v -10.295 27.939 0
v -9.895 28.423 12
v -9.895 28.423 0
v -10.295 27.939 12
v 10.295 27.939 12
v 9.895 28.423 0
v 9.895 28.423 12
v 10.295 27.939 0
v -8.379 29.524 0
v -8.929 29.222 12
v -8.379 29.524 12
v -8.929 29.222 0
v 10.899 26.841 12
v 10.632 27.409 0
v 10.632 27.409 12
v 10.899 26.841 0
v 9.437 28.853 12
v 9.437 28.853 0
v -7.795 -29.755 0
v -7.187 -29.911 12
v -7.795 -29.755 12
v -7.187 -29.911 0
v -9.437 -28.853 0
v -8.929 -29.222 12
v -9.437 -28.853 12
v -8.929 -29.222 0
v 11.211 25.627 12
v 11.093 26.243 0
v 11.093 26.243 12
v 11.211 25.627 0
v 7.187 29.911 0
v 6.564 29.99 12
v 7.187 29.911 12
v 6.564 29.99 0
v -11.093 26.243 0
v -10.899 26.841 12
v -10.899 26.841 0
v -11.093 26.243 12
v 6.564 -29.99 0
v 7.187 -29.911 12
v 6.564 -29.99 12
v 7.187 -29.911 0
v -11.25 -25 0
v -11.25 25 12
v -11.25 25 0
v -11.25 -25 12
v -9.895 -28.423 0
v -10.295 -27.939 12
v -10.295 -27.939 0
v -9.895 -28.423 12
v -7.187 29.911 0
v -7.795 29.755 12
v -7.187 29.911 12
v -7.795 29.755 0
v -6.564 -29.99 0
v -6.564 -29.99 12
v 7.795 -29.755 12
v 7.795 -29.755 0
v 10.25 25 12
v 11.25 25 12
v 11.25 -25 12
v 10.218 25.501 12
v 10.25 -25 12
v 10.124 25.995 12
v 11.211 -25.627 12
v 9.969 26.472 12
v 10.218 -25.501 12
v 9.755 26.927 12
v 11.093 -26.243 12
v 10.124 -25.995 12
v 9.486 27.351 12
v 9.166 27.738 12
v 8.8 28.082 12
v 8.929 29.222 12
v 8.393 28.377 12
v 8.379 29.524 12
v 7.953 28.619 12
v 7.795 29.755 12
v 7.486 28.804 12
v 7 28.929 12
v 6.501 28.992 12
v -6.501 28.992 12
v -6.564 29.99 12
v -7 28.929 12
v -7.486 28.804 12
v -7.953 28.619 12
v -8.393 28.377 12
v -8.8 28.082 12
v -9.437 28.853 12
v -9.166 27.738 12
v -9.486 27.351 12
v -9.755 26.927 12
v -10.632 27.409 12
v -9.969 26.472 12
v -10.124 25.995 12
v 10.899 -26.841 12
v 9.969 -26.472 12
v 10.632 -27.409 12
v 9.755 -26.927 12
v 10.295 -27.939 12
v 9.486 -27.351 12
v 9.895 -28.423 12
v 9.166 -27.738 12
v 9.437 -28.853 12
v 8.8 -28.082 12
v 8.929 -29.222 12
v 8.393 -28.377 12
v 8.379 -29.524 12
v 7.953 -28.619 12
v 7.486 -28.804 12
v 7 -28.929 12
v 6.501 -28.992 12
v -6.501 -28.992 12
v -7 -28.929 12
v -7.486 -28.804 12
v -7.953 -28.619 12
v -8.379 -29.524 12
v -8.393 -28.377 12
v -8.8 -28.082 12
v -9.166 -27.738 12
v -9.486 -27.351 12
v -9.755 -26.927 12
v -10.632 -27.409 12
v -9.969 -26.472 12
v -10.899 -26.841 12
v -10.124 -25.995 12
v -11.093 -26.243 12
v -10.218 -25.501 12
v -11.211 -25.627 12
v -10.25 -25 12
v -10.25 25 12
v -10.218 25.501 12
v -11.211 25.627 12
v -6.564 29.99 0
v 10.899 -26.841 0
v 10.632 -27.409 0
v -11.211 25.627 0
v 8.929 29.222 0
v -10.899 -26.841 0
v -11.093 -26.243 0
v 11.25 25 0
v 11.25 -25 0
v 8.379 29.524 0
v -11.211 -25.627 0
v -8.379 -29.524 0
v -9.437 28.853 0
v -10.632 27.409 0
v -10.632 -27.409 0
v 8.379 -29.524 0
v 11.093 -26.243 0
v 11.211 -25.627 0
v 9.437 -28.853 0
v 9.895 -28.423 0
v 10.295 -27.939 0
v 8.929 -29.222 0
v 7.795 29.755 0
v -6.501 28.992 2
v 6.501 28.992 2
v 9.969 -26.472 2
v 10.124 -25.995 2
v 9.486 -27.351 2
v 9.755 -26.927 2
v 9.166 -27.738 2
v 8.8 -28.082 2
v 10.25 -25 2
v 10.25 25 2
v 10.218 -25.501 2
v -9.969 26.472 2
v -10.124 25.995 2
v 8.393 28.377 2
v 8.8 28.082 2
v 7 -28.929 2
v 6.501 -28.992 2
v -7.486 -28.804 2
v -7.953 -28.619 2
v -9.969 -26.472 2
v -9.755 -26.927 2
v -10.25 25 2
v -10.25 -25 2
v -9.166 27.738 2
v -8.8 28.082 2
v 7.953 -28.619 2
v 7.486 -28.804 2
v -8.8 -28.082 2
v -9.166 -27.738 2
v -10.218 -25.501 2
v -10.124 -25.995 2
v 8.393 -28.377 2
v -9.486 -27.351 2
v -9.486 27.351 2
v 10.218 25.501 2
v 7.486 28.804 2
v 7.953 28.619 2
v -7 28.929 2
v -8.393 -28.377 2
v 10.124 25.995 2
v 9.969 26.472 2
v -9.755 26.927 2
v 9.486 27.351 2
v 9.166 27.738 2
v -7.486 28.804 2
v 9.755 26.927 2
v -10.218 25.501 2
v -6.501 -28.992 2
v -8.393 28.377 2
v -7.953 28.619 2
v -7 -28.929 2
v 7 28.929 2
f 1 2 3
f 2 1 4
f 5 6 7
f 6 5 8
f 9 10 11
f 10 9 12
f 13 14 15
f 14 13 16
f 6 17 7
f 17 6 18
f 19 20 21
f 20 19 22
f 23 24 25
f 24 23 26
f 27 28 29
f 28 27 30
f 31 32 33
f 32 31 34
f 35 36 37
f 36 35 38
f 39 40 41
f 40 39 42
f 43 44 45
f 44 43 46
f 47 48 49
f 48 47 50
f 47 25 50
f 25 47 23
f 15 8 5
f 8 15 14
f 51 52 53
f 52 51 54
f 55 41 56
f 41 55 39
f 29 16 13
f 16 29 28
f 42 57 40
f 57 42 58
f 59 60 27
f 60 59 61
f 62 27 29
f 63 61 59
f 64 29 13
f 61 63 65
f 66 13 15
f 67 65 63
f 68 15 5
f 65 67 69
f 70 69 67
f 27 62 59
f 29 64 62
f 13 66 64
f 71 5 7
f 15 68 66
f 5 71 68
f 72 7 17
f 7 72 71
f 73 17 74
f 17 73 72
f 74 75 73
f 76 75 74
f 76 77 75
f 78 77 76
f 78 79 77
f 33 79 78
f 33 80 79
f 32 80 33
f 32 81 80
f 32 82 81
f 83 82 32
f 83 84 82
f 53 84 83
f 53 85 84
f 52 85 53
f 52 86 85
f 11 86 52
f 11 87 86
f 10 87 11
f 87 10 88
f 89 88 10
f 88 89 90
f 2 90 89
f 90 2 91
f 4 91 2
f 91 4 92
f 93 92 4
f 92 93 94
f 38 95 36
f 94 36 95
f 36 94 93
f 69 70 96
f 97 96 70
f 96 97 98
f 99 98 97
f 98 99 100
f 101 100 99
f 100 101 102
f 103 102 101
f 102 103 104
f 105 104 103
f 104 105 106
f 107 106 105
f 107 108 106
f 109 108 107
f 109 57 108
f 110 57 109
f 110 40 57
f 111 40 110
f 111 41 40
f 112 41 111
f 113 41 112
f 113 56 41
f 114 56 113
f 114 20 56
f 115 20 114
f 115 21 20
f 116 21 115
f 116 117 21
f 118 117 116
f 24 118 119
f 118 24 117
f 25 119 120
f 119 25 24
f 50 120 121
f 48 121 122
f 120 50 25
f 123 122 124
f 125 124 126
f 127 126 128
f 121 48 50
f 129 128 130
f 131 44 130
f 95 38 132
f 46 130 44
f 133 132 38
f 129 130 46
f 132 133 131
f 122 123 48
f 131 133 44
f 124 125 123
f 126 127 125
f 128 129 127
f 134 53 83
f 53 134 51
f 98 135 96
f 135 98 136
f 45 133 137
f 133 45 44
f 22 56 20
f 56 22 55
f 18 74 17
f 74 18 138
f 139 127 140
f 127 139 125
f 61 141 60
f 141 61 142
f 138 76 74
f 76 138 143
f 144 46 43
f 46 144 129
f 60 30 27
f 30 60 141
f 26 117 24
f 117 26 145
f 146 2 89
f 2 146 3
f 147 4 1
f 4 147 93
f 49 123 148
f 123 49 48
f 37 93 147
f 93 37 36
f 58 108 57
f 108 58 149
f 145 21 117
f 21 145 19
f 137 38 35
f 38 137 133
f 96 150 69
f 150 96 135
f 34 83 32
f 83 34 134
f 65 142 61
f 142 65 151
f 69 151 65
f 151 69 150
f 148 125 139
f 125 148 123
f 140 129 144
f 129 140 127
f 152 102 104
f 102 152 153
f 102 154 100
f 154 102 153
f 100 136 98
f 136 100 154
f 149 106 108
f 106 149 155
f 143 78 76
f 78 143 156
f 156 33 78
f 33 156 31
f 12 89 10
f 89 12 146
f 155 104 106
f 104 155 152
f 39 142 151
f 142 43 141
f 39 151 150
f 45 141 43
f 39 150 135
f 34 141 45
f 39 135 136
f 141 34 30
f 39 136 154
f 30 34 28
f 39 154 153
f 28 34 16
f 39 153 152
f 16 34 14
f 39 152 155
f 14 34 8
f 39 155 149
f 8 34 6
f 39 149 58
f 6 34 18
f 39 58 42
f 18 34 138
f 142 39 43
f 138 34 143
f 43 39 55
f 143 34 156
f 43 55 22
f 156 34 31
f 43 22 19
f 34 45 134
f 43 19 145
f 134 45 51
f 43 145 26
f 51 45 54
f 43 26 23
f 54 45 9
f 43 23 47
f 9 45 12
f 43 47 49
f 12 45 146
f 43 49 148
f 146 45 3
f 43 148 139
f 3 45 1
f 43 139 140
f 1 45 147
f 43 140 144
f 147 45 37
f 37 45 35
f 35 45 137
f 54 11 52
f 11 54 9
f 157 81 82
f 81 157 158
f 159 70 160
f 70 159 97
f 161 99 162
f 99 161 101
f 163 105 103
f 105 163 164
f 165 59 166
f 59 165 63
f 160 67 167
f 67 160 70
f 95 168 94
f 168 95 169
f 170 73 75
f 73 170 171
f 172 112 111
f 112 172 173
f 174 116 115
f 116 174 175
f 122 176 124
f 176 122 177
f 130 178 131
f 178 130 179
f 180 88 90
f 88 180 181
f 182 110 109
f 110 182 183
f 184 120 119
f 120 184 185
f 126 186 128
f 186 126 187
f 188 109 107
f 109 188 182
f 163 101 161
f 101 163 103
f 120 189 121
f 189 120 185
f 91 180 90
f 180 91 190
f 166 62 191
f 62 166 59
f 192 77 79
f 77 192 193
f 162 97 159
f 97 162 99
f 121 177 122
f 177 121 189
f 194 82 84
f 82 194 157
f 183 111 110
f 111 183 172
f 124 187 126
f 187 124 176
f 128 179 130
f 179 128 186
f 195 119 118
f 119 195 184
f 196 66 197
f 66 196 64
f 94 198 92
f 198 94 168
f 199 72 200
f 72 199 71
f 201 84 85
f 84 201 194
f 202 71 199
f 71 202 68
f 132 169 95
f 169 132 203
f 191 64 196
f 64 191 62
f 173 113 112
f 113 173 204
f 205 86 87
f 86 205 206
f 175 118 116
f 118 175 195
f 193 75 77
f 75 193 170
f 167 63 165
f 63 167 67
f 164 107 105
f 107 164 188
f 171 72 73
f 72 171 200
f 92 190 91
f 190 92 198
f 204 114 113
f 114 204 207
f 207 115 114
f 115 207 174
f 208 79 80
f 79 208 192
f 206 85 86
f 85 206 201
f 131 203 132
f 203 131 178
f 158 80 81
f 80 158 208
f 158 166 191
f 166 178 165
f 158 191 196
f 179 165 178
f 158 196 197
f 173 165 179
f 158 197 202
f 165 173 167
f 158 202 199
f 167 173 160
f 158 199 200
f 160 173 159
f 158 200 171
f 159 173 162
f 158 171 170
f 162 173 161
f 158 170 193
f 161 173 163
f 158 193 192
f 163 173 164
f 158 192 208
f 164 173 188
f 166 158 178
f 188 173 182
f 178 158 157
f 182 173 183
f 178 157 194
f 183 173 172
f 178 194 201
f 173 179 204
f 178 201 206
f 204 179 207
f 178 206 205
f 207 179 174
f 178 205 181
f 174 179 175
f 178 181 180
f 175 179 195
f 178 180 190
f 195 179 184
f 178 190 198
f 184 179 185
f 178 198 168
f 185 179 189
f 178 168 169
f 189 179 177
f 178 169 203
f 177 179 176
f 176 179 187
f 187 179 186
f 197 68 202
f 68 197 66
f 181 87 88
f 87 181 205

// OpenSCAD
$fn = 50;


difference() {
	union() {
		hull() {
			translate(v = [-6.2500000000, 25.0000000000, 0]) {
				cylinder(h = 12, r = 5);
			}
			translate(v = [6.2500000000, 25.0000000000, 0]) {
				cylinder(h = 12, r = 5);
			}
			translate(v = [-6.2500000000, -25.0000000000, 0]) {
				cylinder(h = 12, r = 5);
			}
			translate(v = [6.2500000000, -25.0000000000, 0]) {
				cylinder(h = 12, r = 5);
			}
		}
	}
	union() {
		translate(v = [0, 0, 2]) {
			hull() {
				translate(v = [-6.2500000000, 25.0000000000, 0]) {
					cylinder(h = 10, r = 4);
				}
				translate(v = [6.2500000000, 25.0000000000, 0]) {
					cylinder(h = 10, r = 4);
				}
				translate(v = [-6.2500000000, -25.0000000000, 0]) {
					cylinder(h = 10, r = 4);
				}
				translate(v = [6.2500000000, -25.0000000000, 0]) {
					cylinder(h = 10, r = 4);
				}
			}
		}
	}
}
